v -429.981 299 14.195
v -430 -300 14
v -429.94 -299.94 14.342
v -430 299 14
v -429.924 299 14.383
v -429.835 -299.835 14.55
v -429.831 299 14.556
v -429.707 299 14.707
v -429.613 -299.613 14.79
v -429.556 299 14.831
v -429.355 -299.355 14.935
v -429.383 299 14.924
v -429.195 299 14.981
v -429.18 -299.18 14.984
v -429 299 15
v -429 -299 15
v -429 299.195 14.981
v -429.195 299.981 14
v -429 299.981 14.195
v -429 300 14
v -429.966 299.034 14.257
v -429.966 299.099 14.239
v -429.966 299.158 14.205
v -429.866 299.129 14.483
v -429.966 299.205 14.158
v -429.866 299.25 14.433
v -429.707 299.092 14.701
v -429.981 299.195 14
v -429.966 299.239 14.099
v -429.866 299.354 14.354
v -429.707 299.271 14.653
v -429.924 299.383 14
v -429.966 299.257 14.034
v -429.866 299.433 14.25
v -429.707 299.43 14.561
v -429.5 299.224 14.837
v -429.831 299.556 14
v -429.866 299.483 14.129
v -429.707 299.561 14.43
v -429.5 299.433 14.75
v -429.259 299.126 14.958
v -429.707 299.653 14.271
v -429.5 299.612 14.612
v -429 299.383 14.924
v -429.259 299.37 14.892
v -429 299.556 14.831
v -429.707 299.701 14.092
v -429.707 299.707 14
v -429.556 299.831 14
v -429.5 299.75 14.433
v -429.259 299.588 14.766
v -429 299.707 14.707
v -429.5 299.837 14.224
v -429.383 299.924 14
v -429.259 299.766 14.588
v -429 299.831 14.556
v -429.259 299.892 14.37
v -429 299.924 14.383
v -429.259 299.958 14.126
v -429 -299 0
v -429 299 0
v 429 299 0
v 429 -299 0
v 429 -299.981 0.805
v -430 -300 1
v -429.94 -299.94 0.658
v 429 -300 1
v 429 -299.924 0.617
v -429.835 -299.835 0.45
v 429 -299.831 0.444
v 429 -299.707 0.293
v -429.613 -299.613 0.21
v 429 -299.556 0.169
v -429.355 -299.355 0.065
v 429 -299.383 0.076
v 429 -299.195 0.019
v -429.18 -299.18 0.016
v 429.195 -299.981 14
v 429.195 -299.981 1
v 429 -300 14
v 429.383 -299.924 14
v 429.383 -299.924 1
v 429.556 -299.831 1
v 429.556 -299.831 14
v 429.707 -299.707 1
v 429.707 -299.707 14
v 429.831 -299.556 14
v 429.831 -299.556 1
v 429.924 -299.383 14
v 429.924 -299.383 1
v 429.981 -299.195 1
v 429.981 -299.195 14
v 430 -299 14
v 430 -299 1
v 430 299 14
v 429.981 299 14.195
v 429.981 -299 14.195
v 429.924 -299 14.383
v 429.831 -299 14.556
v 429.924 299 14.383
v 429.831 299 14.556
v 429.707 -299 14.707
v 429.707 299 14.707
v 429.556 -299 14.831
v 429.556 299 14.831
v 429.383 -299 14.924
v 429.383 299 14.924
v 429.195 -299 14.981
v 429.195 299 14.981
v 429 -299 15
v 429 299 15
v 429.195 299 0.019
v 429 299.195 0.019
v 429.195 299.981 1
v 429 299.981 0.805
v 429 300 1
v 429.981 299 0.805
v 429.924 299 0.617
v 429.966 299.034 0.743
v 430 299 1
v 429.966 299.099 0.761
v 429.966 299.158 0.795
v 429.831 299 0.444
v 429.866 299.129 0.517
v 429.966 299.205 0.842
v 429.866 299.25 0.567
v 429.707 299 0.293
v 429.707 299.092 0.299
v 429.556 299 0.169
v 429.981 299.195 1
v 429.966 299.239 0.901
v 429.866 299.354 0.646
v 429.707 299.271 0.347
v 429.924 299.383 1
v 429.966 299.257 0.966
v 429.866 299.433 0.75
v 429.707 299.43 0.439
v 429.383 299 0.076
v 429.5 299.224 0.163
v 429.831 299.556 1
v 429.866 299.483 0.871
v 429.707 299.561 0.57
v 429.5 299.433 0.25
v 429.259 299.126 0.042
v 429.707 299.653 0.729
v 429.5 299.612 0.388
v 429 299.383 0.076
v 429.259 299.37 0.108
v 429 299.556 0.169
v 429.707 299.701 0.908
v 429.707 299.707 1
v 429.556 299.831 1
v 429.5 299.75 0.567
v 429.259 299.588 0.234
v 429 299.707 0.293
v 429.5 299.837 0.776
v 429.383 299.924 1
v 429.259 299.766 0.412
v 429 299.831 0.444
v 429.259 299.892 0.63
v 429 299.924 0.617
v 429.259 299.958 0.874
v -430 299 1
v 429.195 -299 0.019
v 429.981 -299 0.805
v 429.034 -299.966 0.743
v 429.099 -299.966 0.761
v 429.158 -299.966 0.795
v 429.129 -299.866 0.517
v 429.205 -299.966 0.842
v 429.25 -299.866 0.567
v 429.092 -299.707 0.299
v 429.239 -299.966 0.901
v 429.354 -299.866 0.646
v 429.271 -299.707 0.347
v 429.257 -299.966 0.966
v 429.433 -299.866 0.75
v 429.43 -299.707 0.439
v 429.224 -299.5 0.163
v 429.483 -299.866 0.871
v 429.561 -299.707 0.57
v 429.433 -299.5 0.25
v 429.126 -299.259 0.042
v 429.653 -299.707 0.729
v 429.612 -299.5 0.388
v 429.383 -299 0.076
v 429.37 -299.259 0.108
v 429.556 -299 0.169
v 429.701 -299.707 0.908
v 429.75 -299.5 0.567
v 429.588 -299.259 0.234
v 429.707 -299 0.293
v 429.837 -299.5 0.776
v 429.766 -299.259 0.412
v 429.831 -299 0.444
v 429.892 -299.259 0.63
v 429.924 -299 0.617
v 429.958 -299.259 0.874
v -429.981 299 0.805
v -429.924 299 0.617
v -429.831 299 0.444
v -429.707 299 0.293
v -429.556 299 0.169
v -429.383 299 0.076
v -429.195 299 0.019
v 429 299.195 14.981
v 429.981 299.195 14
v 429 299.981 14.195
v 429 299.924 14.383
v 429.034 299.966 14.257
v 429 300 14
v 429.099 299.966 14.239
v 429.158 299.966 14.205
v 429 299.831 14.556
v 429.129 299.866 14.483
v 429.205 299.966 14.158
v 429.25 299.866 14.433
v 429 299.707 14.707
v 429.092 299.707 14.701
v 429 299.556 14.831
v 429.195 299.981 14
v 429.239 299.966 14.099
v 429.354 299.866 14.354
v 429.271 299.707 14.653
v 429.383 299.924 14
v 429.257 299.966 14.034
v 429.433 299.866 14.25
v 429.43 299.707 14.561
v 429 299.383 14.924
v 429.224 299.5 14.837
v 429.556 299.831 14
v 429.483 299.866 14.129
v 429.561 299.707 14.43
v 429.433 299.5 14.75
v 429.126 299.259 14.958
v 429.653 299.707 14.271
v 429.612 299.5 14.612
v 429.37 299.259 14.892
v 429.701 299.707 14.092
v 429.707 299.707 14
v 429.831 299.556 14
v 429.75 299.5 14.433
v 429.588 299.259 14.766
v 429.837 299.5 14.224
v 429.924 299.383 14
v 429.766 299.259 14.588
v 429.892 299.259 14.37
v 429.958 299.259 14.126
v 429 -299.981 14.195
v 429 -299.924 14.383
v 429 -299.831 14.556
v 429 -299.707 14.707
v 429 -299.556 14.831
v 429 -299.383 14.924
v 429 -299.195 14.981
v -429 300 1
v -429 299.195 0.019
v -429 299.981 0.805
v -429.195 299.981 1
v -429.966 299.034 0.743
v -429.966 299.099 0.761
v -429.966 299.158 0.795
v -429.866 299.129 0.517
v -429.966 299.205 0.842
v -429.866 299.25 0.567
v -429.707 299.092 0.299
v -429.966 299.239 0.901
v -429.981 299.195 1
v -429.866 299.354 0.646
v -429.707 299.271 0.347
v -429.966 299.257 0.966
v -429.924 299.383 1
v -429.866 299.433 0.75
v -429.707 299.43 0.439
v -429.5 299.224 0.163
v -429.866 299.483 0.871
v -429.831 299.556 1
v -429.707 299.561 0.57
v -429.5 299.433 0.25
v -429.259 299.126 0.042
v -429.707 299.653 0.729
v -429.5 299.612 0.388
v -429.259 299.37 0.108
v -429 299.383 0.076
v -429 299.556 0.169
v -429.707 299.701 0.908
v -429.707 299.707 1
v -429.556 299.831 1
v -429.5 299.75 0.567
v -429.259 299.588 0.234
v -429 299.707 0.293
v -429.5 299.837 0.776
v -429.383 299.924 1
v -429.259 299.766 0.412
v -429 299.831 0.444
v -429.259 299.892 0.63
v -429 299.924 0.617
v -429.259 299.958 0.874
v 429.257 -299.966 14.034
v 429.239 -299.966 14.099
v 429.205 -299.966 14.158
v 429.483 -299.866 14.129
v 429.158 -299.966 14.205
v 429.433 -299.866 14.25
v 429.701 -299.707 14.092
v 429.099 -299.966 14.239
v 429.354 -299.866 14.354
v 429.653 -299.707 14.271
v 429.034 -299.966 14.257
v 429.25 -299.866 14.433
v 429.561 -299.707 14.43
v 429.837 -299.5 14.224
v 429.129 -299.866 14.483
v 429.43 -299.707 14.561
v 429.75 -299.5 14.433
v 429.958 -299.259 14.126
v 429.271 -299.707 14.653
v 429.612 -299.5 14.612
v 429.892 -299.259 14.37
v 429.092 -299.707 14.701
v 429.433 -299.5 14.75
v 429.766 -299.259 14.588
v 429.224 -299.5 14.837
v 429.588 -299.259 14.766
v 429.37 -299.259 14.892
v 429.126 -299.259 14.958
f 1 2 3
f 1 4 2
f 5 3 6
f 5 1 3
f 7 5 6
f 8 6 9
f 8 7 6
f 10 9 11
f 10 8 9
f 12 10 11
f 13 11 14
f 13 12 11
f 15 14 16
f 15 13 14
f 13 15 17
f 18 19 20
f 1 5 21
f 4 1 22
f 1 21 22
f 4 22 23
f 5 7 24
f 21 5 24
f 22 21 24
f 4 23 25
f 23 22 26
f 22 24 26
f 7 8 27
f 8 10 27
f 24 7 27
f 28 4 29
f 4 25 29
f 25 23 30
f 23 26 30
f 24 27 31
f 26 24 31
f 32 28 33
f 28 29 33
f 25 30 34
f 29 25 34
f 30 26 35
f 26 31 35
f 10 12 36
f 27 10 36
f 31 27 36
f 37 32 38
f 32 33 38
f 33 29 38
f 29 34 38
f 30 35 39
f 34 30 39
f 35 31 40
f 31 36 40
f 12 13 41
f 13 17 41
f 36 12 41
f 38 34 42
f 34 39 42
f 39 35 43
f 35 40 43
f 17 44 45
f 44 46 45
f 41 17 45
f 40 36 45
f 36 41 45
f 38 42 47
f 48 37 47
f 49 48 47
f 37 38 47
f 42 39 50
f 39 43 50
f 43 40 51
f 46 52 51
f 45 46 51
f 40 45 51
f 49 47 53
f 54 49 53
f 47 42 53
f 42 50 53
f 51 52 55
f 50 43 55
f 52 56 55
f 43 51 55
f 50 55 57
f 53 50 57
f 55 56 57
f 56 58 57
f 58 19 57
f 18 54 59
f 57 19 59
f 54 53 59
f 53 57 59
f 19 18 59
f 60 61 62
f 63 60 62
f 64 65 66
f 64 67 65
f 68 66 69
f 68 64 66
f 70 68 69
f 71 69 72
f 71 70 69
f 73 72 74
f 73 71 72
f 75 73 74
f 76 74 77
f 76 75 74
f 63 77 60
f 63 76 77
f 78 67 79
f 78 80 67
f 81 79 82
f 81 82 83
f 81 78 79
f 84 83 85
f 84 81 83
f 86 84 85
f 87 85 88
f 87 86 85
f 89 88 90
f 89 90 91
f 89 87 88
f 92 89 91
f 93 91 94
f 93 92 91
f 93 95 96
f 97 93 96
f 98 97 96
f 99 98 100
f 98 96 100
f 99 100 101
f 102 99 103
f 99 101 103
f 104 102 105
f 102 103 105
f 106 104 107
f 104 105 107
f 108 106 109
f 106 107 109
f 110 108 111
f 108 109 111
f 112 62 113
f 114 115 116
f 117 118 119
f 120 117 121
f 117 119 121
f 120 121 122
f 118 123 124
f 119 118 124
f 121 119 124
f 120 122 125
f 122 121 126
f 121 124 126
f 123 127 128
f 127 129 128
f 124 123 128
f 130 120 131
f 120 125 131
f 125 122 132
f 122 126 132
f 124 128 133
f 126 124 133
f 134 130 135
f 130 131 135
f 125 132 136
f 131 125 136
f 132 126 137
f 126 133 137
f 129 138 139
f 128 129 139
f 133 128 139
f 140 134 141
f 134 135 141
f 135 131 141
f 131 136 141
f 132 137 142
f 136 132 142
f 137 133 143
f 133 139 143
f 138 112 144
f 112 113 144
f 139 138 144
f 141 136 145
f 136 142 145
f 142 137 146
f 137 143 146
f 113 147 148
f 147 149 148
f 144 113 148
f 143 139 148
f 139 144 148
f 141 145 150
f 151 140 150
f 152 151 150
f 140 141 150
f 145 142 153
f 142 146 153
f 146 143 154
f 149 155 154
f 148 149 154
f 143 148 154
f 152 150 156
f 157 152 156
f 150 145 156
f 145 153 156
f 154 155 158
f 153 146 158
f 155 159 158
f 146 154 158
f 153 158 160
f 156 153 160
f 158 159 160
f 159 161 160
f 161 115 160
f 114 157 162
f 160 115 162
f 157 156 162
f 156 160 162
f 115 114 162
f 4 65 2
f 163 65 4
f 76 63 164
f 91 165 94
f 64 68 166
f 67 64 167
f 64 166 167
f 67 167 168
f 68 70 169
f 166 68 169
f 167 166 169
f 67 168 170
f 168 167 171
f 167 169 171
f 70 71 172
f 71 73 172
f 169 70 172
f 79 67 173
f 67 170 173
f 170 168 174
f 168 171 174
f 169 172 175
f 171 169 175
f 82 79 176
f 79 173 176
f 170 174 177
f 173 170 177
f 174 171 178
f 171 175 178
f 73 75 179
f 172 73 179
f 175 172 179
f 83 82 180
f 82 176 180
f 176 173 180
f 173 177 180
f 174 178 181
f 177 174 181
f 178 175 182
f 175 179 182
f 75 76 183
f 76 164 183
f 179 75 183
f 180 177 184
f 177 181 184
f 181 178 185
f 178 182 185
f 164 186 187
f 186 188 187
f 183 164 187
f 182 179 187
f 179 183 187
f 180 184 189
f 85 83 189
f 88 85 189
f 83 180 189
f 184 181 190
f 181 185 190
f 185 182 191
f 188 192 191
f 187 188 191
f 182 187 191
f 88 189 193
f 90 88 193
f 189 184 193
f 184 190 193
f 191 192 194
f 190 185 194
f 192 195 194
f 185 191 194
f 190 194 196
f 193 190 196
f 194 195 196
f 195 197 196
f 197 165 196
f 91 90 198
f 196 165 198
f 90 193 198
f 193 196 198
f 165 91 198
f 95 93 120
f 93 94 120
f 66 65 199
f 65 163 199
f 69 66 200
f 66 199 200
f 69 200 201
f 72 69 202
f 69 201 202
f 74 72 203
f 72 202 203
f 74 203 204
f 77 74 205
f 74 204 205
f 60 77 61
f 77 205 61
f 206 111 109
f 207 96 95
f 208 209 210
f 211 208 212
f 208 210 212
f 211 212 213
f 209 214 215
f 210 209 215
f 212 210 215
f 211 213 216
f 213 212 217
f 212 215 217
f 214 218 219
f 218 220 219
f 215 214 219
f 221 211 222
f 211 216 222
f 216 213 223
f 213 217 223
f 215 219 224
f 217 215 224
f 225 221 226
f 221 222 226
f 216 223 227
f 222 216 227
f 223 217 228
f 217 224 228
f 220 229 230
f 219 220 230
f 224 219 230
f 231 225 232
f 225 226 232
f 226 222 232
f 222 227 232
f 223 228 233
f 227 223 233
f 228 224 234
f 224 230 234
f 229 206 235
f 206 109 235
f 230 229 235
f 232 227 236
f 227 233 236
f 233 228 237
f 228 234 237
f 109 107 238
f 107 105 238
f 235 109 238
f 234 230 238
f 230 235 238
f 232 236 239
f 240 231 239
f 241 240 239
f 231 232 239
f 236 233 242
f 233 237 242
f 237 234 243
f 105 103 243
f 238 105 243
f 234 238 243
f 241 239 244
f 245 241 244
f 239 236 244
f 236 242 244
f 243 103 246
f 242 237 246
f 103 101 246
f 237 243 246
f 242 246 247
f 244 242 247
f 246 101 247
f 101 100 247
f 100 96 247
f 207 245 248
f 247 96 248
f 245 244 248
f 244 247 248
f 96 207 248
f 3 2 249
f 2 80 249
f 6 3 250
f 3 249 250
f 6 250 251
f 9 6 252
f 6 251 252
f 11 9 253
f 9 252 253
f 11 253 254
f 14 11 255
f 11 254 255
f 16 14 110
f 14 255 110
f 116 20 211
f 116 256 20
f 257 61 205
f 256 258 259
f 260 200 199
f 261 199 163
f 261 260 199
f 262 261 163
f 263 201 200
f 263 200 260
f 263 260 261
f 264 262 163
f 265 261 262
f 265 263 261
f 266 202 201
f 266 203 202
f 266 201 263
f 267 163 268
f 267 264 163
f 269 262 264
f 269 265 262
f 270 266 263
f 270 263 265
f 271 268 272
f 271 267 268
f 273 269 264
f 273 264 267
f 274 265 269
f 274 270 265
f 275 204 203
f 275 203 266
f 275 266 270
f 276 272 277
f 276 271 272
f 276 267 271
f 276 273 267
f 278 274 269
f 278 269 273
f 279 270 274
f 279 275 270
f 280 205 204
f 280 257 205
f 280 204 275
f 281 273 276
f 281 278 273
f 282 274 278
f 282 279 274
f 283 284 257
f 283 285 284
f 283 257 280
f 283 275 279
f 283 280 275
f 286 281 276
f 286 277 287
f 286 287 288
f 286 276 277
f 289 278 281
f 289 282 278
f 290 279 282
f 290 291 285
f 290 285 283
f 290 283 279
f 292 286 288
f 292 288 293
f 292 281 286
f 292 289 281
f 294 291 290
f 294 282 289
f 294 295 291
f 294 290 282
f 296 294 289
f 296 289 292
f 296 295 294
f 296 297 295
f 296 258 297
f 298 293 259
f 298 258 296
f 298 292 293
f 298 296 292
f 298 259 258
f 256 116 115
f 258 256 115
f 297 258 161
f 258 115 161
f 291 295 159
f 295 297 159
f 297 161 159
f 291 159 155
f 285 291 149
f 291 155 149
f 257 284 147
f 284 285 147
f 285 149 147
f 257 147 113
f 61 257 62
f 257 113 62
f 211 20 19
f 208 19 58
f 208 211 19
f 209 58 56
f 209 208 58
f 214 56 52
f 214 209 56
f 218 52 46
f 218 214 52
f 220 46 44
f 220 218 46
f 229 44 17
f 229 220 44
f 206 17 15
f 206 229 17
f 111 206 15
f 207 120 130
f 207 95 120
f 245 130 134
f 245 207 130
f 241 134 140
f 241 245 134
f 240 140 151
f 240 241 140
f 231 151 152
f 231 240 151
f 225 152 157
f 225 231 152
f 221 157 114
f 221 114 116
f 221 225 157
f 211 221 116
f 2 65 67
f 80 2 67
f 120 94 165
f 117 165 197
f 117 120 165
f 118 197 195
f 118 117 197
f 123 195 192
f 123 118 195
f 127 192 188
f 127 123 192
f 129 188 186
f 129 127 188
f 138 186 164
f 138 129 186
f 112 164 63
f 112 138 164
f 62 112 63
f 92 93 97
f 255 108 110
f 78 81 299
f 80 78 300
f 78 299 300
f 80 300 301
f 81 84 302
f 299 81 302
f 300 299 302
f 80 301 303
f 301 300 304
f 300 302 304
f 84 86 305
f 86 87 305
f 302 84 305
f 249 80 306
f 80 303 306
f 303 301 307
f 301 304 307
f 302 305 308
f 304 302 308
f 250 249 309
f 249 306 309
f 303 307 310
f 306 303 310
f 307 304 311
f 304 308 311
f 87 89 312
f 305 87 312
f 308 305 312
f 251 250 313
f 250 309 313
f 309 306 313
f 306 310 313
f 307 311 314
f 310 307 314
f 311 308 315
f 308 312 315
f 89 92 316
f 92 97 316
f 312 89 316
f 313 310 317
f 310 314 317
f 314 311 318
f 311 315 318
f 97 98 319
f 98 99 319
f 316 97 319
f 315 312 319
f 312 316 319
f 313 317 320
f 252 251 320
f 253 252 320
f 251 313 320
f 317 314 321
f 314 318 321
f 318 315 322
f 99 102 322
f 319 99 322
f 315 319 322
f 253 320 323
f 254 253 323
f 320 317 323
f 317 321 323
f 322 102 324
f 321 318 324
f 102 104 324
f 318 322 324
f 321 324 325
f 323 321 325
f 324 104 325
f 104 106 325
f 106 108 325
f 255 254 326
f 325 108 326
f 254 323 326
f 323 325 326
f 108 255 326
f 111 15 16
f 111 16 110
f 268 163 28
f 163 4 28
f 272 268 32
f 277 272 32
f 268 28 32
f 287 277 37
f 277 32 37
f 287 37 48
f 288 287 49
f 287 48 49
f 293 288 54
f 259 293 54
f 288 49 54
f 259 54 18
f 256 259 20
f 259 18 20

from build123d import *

# Parameters (mm, degrees)
SKETCH1_W           = 860
SKETCH1_H           = 600
BOSS_EXTRUDE1_DEPTH = 15
FILLET1_R           = 1


with BuildPart() as part:
    # Sketch1 → Boss-Extrude1 (new body)
    with BuildSketch(Plane.XY):
        Rectangle(SKETCH1_W, SKETCH1_H)
    extrude(amount=BOSS_EXTRUDE1_DEPTH)

    # Fillet1
    fillet1_edges = [part.edges().sort_by_distance(p)[0] for p in [
        (430, 0, 15),
        (0, 300, 15),
        (-430, 0, 15),
        (0, 300, 0),
        (430, 0, 0),
        (0, -300, 0),
        (-430, 0, 0),
        (-430, 300, 7.5),
        (430, 300, 7.5),
        (430, -300, 7.5),
        (0, -300, 15),
    ]]
    fillet(fillet1_edges, radius=FILLET1_R)


solid = part.part
